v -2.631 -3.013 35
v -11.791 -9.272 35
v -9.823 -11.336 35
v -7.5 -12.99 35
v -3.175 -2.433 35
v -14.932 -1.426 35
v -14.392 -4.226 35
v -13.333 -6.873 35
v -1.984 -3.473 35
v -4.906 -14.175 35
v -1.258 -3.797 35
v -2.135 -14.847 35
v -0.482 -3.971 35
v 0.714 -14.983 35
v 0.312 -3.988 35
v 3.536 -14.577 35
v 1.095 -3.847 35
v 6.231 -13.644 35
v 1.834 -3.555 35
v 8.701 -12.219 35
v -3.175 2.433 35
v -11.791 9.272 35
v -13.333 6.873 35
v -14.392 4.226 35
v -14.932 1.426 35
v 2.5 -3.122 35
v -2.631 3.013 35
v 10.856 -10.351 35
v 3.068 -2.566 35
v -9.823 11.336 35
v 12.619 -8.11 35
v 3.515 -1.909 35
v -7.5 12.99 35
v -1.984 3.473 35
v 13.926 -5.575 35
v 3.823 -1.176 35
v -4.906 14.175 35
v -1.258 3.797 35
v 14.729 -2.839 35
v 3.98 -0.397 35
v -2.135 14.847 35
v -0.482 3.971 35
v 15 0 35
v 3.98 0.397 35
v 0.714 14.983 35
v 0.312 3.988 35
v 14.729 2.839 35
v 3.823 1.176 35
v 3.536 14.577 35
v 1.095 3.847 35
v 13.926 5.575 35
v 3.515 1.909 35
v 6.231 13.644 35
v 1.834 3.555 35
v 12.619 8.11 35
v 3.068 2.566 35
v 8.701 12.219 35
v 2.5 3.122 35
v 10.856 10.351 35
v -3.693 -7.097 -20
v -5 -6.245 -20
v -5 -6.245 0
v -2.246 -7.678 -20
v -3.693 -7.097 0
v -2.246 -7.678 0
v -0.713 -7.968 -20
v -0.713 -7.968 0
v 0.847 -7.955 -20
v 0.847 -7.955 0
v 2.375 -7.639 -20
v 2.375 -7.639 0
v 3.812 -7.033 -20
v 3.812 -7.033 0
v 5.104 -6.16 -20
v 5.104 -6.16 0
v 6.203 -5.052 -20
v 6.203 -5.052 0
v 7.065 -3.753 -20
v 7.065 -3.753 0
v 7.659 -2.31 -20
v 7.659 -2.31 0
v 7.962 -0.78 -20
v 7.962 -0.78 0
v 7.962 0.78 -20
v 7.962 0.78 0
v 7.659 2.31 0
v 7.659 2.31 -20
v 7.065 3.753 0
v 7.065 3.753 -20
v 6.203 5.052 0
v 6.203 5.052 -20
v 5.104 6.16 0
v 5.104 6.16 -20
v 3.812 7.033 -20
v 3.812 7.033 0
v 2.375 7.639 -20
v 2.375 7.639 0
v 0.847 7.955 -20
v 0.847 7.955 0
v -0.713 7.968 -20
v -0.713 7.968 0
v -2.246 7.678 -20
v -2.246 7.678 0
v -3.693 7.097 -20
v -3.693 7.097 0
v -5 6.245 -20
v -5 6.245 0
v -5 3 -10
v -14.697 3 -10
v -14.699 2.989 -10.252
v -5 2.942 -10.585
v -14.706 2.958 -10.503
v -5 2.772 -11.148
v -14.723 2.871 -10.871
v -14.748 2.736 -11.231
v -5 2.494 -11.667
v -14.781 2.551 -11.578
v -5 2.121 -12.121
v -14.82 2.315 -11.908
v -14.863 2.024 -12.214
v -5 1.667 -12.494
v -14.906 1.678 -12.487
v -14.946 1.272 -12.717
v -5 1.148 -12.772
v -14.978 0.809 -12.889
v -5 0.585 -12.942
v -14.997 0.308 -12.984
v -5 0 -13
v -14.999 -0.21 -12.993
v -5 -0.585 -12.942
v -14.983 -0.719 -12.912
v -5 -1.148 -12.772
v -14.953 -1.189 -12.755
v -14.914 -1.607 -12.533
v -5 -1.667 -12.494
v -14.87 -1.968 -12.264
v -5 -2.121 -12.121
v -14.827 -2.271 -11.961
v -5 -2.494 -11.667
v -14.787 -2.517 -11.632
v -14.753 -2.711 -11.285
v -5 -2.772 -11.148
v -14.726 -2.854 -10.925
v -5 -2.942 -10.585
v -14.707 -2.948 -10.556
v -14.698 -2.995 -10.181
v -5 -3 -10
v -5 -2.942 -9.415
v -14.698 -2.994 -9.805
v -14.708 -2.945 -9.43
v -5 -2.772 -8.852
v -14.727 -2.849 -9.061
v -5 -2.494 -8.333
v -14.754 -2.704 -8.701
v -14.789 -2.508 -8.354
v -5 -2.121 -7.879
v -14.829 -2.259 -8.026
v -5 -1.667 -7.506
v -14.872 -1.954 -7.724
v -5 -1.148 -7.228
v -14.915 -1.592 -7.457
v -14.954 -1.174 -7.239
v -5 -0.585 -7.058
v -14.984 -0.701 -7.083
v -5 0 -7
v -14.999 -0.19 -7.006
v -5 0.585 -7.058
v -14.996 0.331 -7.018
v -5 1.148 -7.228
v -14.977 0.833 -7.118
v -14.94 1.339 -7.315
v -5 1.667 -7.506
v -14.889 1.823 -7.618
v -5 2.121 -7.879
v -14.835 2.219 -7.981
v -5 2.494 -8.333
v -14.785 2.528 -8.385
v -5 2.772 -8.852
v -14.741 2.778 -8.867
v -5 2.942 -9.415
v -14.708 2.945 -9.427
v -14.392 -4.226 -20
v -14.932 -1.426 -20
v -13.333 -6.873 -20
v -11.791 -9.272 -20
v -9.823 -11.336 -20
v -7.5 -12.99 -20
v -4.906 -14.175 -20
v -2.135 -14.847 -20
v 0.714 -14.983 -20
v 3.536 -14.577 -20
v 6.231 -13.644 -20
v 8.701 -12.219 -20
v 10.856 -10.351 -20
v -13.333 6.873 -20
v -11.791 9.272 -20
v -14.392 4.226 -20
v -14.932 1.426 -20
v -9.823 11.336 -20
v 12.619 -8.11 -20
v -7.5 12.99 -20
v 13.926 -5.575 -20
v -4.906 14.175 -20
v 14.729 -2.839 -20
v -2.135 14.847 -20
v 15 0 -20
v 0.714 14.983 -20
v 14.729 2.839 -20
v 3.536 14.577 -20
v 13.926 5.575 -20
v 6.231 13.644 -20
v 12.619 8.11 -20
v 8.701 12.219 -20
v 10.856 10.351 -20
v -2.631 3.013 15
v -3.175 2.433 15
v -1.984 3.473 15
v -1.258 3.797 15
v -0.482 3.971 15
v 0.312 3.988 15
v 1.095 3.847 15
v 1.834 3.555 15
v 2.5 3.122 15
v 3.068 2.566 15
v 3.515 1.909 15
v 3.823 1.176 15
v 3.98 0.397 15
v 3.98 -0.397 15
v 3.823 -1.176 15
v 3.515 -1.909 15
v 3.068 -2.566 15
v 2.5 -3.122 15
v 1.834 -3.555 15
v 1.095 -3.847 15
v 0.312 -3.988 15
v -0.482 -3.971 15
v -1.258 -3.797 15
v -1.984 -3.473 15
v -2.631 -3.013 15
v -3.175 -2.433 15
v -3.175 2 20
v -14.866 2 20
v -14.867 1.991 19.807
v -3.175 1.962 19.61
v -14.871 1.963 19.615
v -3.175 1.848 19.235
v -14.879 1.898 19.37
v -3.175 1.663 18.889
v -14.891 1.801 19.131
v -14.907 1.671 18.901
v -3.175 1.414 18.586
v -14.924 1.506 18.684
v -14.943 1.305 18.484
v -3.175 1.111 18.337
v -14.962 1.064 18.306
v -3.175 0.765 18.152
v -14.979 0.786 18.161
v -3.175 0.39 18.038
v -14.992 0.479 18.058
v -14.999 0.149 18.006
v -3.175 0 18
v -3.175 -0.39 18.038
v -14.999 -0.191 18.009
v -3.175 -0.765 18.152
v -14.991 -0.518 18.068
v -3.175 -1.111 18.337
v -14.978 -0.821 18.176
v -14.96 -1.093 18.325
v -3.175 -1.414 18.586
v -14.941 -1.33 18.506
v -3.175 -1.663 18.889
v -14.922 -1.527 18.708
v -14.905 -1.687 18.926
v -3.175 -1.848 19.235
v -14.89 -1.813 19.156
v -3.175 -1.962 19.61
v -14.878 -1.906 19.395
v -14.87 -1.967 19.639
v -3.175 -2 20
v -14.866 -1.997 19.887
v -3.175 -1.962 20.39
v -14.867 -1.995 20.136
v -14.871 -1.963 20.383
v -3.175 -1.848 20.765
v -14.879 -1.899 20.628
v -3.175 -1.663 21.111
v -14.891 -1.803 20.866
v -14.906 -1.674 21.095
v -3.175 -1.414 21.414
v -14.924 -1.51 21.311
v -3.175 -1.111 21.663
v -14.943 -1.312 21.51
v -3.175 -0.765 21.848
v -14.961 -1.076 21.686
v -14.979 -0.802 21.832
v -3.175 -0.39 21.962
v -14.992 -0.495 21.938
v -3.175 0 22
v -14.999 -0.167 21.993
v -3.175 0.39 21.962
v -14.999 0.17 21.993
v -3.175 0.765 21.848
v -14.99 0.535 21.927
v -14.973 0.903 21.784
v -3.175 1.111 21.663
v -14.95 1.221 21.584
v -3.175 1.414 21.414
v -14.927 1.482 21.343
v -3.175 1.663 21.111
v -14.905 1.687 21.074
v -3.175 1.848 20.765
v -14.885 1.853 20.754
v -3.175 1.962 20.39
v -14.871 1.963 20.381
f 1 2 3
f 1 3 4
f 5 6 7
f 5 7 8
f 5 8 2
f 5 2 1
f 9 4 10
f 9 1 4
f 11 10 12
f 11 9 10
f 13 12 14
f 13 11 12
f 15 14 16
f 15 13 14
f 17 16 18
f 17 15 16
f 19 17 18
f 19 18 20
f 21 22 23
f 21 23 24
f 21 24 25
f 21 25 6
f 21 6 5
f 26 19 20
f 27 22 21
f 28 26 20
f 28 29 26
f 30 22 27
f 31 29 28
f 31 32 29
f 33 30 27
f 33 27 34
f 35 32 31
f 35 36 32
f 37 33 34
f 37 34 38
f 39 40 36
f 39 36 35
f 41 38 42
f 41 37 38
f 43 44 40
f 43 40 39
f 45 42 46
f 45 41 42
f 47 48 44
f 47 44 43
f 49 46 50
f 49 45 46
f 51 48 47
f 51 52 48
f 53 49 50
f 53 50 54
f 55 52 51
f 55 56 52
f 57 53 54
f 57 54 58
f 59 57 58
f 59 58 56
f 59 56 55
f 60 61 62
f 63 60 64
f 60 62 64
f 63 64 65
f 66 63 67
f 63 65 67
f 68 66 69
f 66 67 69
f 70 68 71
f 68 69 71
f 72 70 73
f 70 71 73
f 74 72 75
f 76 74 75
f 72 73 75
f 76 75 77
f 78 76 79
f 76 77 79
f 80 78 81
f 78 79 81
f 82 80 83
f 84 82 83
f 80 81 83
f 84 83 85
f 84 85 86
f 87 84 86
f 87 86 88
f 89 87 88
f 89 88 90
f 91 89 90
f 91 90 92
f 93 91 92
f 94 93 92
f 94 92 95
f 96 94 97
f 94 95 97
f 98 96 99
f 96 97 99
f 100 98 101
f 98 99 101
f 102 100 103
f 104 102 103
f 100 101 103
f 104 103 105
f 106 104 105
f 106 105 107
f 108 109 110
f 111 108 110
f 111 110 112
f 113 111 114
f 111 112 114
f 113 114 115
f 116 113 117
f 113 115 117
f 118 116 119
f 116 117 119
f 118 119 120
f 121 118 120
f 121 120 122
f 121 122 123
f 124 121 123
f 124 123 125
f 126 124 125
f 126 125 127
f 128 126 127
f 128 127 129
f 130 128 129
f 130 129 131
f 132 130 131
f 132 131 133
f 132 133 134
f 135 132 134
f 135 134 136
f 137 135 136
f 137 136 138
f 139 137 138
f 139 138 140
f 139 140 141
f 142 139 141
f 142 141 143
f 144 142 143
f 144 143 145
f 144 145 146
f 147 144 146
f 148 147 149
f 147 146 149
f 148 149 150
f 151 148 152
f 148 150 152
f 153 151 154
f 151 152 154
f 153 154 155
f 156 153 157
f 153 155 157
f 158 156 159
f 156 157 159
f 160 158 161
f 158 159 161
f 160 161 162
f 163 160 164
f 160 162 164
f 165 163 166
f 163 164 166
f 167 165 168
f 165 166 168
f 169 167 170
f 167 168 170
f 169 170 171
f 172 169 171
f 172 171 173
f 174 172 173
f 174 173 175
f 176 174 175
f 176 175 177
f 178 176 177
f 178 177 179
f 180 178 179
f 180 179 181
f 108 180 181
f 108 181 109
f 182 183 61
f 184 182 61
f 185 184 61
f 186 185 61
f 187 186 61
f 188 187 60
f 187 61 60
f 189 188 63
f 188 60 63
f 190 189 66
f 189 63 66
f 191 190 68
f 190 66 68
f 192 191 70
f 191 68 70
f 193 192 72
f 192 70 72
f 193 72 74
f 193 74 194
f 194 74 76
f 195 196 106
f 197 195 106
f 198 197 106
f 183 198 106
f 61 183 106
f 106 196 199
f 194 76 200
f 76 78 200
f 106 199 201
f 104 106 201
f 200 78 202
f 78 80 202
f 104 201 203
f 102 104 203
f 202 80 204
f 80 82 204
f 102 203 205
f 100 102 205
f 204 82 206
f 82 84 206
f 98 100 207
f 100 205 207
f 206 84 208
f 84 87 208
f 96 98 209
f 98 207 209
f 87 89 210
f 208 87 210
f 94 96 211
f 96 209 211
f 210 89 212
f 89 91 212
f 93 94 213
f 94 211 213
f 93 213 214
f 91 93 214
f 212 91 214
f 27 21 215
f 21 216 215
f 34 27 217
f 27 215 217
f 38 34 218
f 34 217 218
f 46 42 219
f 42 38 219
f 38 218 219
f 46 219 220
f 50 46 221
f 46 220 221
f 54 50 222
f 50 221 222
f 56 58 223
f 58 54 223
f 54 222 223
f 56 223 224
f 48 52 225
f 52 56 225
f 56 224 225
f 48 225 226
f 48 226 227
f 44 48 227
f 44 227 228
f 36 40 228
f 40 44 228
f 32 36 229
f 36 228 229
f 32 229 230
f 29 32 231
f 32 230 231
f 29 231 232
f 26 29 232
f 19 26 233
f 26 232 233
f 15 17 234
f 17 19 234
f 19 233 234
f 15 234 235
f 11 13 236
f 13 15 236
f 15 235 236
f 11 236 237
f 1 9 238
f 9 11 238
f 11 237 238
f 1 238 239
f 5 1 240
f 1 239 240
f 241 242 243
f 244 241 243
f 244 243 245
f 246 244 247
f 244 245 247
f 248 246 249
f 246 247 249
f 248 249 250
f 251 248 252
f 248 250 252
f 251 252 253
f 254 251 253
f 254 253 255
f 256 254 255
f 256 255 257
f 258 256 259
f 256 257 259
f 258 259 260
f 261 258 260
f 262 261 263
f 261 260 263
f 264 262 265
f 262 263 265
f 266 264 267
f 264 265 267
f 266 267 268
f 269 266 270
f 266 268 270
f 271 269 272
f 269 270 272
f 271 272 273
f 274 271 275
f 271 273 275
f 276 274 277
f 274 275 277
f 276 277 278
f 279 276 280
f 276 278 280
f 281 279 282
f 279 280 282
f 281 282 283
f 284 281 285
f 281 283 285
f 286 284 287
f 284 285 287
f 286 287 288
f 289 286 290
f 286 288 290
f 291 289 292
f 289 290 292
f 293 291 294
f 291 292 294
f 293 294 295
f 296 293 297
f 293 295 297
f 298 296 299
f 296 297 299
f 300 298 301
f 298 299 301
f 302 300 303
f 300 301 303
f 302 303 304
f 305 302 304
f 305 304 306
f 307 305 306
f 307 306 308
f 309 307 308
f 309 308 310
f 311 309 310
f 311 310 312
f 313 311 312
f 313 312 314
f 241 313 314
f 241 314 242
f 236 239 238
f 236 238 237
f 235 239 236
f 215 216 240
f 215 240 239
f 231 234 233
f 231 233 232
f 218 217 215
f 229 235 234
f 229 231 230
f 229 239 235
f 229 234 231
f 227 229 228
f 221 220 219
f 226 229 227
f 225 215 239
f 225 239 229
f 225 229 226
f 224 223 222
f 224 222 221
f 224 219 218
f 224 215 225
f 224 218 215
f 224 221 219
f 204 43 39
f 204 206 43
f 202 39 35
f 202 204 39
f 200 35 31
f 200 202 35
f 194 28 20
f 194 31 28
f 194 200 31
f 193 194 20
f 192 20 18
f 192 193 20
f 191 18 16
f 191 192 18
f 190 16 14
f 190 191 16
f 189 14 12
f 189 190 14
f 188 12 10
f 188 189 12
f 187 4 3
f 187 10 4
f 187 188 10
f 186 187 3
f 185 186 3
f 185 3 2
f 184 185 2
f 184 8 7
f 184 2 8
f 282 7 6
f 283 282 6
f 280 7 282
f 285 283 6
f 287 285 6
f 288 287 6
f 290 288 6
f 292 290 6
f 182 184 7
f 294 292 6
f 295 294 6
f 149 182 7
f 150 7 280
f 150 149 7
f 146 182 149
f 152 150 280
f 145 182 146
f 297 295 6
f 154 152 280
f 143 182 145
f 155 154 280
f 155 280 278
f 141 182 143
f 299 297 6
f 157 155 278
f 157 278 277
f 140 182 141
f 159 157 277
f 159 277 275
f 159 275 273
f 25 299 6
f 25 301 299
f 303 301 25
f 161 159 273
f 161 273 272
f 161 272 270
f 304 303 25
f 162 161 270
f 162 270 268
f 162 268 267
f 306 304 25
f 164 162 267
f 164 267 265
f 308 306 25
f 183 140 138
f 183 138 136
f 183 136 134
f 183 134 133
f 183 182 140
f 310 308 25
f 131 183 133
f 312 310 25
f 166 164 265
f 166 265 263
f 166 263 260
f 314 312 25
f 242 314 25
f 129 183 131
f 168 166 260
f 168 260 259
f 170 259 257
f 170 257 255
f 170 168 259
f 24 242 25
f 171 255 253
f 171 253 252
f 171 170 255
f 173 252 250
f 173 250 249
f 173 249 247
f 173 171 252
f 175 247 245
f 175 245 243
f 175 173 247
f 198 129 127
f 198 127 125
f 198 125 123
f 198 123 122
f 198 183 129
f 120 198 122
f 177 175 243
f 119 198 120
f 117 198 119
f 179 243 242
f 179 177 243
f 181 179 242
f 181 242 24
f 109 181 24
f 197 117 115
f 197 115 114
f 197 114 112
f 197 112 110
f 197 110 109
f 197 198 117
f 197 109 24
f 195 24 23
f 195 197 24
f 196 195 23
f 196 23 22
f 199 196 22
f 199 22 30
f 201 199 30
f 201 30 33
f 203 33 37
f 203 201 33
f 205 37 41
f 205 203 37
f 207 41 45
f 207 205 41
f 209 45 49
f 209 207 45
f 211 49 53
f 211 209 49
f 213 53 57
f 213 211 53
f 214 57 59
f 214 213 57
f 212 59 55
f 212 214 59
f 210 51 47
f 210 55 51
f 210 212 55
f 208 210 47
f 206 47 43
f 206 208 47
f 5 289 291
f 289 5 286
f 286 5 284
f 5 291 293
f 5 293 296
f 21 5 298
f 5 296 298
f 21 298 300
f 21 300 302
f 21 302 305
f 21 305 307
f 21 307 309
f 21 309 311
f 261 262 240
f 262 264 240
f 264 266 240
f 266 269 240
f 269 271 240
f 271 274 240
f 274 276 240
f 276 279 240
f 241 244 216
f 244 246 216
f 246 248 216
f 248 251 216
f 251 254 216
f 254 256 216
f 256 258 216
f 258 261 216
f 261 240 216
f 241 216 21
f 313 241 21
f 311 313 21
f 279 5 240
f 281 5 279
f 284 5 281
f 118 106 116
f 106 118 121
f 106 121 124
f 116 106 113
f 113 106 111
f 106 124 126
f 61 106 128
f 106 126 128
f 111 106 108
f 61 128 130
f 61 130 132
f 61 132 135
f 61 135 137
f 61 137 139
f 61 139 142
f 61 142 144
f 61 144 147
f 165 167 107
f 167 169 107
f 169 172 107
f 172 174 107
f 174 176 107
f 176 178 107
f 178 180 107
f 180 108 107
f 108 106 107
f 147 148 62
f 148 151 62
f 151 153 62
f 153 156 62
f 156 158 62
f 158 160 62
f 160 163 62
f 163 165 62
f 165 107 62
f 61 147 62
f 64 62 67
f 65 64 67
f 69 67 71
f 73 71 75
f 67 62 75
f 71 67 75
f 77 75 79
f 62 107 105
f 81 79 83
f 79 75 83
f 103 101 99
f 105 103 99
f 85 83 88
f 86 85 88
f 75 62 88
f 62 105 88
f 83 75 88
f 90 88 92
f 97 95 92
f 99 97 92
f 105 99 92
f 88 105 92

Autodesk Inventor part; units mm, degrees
ref_plane "XZ Plane" through (0, 0, 0) normal (0, 1, 0) x (-1, 0, 0)
ref_plane "XY Plane" through (0, 0, 0) normal (0, 0, 1) x (1, 0, 0)
sketch "Sketch1" plane through (0, 0, 0) normal (0, 0, 1) x (1, 0, 0)
  line L0 (-5, 6.245) -> (-5, -6.245) projected
  arc A0 (-5, -6.245) -> (-5, 6.245) centre (0, 0) ccw projected
  circle A1 centre (0, 0) radius 15
  dimension "d0" = 30
extrude "Extrusion1" add sketch "Sketch1" against normal blind 20
sketch "Sketch2" plane through (0, 0, 0) normal (0, 0, 1) x (1, 0, 0)
  circle A0 centre (0, 0) radius 15 projected
extrude "Extrusion2" add sketch "Sketch2" along normal blind 15
sketch "Sketch3" plane through (0, 0, 15) normal (0, 0, 1) x (1, 0, 0)
  line L0 (-3.175, -2.433) -> (-3.175, 2.433) projected
  arc A0 (-3.175, -2.433) -> (-3.175, 2.433) centre (0, 0) ccw projected
  circle A1 centre (0, 0) radius 15 projected
extrude "Extrusion3" add sketch "Sketch3" along normal blind 20
ref_plane "Work Plane1" through (-30.75, 0, 0) normal (1, 0, 0) x (0, 1, 0)
sketch "Sketch4" plane through (-30.75, 0, 0) normal (1, 0, 0) x (0, 1, 0)
  line L0 (15, 35) -> (-15, 35) projected
  line L1 (-15, -20) -> (15, -20) projected
  line L2 (-15, 35) -> (-15, -20) projected
  line L3 (15, 35) -> (15, -20) projected
  circle A0 centre (0, -10) radius 3
  circle A1 centre (0, 20) radius 2
  point P0 (0, 0)
  dimension "d8" = 4
  dimension "d9" = 6
  dimension "d10" = 10
  dimension "d11" = 15
extrude "Extrusion4" cut sketch "Sketch4" along normal up to surface (30.75 mm away) contours A0 | A1
thread "Thread1" size "M6x1" class "6H" standard "ANSI Metric M Profile" length 60
thread "Thread2" size "M4x0.7" class "6H" standard "ANSI Metric M Profile" length 60
properties part number "ballscrew coupler" material "Steel, Mild"
